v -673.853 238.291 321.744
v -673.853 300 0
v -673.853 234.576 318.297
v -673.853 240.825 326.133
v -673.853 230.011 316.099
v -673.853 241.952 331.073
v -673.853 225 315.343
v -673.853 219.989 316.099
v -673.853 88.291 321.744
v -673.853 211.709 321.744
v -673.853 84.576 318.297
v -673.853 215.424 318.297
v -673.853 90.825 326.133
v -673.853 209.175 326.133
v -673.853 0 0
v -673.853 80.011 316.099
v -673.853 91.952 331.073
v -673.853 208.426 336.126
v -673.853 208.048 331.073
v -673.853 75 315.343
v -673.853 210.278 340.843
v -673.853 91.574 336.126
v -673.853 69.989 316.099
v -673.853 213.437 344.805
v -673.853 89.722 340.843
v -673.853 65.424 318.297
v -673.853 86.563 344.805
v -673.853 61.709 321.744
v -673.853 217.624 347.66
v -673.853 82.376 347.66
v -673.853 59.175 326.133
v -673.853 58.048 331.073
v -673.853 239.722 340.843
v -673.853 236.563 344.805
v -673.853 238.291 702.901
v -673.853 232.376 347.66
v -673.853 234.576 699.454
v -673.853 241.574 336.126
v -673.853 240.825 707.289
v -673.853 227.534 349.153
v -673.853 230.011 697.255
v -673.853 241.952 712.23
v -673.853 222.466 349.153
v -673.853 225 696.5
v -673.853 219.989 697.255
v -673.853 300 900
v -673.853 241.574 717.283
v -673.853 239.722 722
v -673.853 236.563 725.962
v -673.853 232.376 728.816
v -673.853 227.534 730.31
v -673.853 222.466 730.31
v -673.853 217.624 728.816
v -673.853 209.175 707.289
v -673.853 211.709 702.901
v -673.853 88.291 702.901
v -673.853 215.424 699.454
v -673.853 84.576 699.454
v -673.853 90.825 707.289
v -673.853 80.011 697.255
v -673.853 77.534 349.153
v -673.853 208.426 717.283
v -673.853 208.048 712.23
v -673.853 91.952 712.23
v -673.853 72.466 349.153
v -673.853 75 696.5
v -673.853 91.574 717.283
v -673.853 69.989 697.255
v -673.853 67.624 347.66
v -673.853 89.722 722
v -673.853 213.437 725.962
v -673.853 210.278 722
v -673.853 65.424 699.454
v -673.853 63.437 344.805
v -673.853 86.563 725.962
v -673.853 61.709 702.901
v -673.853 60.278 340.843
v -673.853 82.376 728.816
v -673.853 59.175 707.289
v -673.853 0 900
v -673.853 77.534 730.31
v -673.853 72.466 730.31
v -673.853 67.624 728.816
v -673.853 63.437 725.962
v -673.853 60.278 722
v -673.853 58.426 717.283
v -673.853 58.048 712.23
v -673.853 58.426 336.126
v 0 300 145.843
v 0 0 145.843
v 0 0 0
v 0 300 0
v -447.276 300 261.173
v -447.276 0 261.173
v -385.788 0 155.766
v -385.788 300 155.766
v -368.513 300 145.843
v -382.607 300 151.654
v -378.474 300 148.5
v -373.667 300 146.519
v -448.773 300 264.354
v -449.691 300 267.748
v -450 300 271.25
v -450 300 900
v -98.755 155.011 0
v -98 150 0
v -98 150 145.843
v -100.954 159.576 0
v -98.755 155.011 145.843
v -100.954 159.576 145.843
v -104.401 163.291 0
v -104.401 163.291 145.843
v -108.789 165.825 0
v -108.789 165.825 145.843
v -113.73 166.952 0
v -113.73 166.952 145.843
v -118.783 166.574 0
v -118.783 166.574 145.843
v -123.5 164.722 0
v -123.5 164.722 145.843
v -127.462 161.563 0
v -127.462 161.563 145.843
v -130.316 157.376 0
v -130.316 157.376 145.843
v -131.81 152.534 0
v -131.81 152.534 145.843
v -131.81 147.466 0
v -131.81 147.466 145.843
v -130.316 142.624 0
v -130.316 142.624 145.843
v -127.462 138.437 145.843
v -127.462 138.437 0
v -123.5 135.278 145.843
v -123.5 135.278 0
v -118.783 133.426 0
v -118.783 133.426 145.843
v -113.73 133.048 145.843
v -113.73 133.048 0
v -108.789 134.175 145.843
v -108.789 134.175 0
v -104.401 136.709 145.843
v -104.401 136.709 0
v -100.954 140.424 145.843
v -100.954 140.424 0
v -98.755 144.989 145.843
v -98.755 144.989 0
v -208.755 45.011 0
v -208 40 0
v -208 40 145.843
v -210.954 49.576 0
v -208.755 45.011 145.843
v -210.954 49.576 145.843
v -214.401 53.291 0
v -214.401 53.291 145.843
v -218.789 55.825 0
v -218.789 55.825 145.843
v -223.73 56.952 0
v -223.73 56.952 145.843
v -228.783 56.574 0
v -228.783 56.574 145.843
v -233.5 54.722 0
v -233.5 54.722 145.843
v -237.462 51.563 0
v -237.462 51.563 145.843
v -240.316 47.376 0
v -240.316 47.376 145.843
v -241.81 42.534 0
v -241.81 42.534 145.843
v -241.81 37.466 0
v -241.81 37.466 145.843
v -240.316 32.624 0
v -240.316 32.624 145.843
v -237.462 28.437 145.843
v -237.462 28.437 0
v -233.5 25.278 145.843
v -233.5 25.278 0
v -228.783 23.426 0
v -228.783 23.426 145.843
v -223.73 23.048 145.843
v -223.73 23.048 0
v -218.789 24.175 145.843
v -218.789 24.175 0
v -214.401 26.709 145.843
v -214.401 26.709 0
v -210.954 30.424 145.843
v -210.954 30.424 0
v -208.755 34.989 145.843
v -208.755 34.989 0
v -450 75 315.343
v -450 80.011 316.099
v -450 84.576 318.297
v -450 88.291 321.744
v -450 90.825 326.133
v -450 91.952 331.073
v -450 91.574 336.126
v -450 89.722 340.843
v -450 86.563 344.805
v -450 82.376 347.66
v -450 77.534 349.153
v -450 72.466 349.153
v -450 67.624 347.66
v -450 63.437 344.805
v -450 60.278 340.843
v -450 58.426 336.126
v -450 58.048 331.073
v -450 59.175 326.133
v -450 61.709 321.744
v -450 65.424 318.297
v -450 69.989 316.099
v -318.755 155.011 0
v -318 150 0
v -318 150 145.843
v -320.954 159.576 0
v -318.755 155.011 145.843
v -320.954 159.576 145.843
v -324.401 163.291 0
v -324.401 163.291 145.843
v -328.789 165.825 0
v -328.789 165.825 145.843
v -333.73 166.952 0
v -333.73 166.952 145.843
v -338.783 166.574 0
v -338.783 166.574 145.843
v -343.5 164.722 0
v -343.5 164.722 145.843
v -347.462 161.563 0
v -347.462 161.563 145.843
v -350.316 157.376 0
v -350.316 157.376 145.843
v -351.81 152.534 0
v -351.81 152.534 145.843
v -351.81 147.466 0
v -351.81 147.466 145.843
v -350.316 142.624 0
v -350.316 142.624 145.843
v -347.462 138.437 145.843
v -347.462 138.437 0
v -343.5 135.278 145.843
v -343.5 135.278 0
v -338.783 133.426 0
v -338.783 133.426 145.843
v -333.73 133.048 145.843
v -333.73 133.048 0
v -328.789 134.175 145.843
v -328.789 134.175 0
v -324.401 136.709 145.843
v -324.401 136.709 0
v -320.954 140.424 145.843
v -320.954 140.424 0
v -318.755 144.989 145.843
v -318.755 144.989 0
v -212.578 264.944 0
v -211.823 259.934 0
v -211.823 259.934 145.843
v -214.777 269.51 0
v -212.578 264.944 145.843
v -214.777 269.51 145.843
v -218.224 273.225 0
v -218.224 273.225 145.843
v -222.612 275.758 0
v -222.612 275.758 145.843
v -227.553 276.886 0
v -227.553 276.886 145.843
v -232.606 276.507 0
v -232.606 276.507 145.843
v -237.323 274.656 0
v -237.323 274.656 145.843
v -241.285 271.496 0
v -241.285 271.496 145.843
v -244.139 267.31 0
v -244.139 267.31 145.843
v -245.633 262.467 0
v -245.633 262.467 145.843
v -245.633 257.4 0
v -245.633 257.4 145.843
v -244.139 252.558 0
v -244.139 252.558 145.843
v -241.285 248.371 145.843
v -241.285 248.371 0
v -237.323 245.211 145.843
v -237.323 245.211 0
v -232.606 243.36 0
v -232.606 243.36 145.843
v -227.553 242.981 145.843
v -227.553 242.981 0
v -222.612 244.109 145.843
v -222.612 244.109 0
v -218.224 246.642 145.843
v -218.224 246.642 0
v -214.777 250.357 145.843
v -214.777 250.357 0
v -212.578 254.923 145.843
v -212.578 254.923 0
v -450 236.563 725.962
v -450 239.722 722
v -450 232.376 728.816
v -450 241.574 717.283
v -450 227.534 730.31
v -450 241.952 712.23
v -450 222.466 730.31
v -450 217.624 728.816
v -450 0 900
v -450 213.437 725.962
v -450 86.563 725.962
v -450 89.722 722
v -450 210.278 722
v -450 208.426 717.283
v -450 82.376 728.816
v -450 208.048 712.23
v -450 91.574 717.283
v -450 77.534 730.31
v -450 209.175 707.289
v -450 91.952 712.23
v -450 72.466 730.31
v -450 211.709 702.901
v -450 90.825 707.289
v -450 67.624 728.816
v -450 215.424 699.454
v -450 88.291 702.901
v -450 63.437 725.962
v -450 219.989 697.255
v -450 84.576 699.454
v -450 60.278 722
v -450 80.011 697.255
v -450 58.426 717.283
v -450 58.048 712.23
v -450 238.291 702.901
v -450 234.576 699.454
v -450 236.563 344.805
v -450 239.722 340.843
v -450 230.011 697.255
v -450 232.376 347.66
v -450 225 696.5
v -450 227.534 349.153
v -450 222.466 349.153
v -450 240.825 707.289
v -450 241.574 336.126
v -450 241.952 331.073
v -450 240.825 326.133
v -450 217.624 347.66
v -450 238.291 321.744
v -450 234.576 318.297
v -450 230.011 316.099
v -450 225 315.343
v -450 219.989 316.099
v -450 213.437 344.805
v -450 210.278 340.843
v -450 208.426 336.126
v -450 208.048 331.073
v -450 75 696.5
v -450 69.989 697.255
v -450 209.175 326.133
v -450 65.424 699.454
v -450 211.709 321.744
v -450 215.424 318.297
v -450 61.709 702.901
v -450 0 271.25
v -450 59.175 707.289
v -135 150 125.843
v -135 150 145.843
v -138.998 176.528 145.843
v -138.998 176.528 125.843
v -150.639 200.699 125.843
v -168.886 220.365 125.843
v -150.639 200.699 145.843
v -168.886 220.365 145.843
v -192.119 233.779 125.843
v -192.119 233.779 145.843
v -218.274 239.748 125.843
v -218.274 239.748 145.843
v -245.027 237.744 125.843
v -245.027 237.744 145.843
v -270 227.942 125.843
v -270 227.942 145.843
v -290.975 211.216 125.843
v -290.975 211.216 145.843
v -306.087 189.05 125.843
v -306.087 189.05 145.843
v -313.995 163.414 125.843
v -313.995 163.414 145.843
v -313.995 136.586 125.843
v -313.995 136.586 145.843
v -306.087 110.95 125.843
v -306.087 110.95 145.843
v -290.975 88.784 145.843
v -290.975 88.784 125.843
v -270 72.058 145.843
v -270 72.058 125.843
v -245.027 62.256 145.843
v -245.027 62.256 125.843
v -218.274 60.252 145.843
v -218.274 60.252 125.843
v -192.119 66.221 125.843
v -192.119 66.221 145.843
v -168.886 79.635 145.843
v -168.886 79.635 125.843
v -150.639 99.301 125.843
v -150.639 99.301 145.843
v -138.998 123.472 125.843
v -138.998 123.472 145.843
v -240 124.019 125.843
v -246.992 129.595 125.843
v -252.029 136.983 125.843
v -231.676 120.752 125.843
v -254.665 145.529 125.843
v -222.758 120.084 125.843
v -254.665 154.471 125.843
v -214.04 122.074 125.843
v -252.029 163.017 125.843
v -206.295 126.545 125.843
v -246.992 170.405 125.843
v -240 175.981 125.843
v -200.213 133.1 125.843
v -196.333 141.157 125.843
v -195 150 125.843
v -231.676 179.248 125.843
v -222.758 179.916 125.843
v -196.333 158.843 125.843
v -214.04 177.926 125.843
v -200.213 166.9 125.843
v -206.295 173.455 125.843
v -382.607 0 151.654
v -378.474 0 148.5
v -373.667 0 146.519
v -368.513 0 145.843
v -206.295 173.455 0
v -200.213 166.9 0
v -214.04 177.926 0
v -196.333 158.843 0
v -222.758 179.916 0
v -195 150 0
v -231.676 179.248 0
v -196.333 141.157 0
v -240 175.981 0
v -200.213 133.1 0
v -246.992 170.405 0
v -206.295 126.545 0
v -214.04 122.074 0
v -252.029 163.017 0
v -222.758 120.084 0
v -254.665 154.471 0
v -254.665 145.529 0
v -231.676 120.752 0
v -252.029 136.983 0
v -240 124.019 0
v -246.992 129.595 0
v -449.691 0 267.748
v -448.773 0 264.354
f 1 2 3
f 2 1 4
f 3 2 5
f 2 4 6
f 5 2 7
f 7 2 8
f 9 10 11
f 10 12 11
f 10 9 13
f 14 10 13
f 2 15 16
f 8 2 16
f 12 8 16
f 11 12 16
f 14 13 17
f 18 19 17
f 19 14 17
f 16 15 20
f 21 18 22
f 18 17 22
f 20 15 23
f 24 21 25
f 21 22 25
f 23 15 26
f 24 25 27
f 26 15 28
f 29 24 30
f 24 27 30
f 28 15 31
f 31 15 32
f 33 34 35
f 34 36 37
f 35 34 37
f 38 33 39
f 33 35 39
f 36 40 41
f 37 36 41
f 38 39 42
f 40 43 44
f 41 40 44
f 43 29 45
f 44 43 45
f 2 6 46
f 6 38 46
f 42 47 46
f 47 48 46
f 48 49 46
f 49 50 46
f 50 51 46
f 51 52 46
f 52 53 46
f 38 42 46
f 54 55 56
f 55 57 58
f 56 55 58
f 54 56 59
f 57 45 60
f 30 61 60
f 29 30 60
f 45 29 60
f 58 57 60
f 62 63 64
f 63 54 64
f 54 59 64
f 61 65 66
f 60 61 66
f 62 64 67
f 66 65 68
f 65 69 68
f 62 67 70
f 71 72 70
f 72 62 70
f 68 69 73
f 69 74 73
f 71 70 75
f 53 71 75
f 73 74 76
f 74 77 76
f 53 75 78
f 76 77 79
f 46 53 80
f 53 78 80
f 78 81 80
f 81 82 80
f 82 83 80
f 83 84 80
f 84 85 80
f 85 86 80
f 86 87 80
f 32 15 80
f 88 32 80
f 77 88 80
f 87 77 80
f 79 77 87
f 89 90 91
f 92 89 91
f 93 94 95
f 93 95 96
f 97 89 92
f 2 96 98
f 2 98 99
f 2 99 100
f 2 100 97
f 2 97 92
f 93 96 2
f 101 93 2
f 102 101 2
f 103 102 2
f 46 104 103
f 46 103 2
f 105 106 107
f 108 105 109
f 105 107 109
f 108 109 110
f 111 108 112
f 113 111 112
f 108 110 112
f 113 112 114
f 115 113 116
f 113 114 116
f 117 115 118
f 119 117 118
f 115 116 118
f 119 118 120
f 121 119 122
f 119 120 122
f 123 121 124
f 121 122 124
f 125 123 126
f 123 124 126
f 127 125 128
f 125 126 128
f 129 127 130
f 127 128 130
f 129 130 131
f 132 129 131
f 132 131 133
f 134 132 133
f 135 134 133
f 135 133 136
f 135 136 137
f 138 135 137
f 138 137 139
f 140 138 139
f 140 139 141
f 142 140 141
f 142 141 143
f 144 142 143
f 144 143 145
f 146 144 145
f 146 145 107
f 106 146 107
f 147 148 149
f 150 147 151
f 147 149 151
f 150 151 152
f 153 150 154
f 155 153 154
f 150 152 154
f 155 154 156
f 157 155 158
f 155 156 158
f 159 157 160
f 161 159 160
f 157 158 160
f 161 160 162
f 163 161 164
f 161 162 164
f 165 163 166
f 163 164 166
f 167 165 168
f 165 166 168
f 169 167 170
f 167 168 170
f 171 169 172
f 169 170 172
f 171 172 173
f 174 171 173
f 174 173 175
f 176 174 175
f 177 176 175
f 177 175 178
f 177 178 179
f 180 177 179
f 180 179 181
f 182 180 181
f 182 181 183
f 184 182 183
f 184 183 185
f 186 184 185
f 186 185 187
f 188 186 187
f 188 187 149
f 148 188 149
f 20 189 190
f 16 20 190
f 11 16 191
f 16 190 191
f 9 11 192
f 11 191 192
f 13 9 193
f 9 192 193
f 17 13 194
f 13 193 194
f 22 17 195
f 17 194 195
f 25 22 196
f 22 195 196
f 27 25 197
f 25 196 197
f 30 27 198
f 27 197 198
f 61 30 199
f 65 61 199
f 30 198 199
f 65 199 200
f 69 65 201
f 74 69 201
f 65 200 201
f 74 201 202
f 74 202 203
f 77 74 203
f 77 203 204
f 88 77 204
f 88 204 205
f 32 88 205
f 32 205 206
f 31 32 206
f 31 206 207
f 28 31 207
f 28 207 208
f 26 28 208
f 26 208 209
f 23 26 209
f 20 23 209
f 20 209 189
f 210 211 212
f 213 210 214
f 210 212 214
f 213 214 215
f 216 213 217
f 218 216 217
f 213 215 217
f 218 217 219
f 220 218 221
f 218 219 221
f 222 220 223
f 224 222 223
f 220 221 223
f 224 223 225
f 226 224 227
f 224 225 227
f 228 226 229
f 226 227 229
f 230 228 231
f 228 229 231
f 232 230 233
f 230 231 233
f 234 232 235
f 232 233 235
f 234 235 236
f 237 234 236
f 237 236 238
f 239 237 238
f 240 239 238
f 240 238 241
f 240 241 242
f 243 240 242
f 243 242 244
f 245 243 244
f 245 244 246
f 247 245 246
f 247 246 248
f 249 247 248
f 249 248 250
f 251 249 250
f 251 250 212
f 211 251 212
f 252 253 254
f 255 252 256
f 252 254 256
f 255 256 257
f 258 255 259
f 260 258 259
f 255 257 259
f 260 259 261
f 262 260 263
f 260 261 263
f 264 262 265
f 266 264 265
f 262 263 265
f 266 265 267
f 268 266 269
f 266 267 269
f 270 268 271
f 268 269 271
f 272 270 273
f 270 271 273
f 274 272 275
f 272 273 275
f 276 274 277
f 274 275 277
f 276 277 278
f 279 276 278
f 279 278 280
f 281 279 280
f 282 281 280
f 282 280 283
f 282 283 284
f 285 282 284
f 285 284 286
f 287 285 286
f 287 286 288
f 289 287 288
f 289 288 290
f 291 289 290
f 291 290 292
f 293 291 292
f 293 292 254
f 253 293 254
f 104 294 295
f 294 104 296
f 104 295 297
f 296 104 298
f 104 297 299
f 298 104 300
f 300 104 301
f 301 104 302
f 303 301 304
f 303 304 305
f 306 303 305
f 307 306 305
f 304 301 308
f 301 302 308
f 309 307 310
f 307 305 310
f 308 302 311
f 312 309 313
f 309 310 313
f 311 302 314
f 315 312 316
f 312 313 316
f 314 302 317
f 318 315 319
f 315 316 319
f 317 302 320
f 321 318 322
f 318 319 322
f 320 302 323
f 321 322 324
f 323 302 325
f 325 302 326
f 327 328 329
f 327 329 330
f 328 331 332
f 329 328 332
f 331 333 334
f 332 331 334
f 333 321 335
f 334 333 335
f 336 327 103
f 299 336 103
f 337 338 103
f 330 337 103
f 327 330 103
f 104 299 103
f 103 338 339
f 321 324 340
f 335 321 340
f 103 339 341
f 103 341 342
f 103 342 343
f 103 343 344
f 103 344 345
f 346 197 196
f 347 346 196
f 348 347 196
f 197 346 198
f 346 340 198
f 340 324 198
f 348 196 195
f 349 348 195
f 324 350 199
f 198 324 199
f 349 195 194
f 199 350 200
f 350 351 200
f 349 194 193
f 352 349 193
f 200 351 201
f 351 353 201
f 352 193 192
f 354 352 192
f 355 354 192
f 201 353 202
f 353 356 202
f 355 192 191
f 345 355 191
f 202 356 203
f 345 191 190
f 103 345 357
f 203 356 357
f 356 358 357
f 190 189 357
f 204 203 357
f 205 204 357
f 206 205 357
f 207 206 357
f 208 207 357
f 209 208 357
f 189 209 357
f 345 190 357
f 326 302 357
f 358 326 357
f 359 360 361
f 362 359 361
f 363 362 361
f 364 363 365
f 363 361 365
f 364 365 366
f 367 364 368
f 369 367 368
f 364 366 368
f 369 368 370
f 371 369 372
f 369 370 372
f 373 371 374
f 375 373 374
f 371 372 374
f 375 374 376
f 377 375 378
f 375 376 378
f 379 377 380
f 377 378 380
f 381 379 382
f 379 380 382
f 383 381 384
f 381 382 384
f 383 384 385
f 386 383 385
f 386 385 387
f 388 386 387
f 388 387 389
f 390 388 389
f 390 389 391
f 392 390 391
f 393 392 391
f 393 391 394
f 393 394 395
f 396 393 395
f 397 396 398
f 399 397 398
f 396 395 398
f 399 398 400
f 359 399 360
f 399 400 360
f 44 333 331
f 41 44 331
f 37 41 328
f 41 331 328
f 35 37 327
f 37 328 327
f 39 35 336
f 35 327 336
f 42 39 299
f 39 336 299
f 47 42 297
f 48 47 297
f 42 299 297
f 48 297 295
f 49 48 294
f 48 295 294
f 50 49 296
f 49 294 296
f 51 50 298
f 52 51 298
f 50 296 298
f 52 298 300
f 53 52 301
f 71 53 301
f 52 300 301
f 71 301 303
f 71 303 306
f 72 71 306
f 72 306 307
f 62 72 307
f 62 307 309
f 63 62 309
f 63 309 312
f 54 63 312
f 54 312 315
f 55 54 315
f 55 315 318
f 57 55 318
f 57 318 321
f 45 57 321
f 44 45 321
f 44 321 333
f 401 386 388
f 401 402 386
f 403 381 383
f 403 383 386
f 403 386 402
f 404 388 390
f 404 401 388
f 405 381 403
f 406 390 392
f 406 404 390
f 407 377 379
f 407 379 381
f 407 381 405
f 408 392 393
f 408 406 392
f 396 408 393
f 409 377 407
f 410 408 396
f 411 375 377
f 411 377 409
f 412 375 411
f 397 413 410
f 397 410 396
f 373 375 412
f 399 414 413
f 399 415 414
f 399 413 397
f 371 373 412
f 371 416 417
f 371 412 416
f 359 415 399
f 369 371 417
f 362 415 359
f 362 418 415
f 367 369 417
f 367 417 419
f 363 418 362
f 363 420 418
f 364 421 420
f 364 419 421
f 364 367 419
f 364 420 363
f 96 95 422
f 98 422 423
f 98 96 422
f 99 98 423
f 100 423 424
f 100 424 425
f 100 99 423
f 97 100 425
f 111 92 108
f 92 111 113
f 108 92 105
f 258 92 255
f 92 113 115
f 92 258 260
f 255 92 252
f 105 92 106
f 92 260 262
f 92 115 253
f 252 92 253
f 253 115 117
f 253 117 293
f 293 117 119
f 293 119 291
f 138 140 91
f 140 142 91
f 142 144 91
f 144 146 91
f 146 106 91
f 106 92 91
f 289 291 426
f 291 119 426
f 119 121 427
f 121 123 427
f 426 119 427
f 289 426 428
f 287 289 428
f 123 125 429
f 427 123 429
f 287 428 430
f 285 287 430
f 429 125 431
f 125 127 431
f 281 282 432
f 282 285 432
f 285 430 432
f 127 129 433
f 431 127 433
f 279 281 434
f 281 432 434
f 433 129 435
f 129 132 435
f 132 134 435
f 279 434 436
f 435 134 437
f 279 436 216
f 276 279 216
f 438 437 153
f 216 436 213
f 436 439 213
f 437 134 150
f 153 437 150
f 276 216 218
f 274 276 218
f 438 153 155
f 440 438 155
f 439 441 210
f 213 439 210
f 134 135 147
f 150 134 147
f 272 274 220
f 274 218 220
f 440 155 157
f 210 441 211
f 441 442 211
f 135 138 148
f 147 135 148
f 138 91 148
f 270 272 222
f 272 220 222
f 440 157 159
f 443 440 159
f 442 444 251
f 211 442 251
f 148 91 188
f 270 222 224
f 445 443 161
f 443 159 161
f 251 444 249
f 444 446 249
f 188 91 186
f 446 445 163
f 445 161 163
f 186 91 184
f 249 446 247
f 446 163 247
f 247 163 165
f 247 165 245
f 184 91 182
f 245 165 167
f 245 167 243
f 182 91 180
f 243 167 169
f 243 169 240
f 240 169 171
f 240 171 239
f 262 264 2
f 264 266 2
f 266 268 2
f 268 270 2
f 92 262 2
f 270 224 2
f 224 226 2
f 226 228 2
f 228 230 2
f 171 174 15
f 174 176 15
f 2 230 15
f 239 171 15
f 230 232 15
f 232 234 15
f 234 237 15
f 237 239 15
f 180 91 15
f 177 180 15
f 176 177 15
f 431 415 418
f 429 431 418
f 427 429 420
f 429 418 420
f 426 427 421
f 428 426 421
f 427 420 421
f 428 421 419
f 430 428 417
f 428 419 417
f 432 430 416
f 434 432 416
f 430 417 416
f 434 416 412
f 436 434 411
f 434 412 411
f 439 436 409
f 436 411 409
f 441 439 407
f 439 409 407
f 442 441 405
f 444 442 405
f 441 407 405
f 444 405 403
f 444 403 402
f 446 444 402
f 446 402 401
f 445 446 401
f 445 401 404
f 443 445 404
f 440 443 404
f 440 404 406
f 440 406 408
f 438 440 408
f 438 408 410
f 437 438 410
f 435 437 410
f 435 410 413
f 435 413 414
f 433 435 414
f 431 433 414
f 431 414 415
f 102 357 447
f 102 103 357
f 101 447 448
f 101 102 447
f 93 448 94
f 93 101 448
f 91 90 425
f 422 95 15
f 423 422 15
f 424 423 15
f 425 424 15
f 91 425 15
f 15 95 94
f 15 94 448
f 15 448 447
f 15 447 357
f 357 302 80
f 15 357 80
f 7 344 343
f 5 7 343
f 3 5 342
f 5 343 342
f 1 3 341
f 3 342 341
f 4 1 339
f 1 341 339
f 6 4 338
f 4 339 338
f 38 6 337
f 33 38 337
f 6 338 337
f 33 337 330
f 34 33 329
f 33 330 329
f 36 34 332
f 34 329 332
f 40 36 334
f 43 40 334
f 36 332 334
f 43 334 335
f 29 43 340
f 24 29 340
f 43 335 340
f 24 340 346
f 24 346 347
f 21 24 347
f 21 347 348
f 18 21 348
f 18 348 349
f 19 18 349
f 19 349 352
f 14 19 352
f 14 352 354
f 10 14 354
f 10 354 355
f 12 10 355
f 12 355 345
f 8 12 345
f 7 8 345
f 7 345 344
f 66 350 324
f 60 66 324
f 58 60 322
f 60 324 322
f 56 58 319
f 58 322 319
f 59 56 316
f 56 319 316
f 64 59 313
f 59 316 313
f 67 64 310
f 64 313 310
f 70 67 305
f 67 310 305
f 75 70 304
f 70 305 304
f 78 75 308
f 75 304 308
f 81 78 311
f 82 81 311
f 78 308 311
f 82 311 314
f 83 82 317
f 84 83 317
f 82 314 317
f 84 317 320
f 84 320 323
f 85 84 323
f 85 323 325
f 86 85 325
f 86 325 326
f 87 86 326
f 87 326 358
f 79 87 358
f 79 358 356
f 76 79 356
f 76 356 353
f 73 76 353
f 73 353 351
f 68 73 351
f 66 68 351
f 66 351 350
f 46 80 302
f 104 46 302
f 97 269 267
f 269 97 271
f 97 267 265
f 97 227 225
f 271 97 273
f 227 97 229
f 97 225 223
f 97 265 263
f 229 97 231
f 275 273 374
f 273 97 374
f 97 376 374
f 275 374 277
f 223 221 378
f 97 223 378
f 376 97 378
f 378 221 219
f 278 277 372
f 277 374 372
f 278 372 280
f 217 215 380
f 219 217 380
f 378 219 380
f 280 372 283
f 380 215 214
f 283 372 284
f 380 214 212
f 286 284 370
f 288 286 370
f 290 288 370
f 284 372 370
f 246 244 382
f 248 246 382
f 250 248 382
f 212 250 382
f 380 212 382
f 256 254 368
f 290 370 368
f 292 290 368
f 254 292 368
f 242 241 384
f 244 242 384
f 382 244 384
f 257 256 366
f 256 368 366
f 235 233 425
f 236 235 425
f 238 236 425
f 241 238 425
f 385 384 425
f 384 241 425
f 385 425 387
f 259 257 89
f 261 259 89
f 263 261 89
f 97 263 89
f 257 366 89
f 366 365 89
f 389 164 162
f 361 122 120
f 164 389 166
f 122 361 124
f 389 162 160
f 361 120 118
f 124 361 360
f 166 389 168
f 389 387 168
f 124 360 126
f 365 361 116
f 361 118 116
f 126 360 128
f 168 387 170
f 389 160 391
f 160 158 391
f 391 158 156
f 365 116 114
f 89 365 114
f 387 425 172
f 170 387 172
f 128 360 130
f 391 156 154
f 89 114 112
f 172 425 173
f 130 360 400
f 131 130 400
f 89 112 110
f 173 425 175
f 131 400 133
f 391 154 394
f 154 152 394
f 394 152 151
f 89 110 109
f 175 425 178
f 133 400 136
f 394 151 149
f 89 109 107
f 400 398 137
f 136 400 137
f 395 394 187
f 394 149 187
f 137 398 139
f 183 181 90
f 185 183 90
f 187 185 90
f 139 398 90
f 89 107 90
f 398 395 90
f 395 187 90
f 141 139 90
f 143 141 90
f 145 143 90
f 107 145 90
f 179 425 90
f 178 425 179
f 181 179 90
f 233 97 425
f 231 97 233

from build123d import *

# Parameters (mm, degrees)
BOSS_EXTRUDE1_DEPTH = 300
SKETCH3_R           = 17
SKETCH3_R_2         = 30
CUT_EXTRUDE1_DEPTH  = 1055.907875982
SKETCH4_R           = 90
CUT_EXTRUDE2_DEPTH  = 20
SKETCH5_R           = 17
CUT_EXTRUDE3_DEPTH  = 1051
CHAMFER1_SIZE       = 70
CHAMFER1_SIZE2      = 120
FILLET1_R           = 20


with BuildPart() as part:
    # Sketch2 → Boss-Extrude1 (new body)
    with BuildSketch(Plane(origin=(0, 0, 0), x_dir=(-1, 0, 0), z_dir=(0, 1, 0))):
        Polygon((0, 0), (673.85334868, 0), (673.85334868, 900), (450, 900), (450, 145.843324447), (0, 145.843324447), align=None)
    extrude(amount=BOSS_EXTRUDE1_DEPTH)

    # Sketch3 → Cut-Extrude1 (cut, through all)
    with BuildSketch(Plane.XY.offset(145.843324447)):
        with Locations((-335, 150)):
            Circle(SKETCH3_R)
        with Locations((-228.822978678, 259.933547355)):
            Circle(SKETCH3_R)
        with Locations((-115, 150)):
            Circle(SKETCH3_R)
        with Locations((-225, 40)):
            Circle(SKETCH3_R)
        with Locations((-225, 150)):
            Circle(SKETCH3_R_2)
    extrude(amount=-CUT_EXTRUDE1_DEPTH, mode=Mode.SUBTRACT)

    # Sketch4 → Cut-Extrude2 (cut)
    with BuildSketch(Plane.XY.offset(145.843324447)):
        with Locations((-225, 150)):
            Circle(SKETCH4_R)
    extrude(amount=-CUT_EXTRUDE2_DEPTH, mode=Mode.SUBTRACT)

    # Sketch5 → Cut-Extrude3 (cut, through all)
    with BuildSketch(Plane.YZ.offset(-450)):
        with Locations(Location((75, 713.5, 0), (0, 0, 270))):
            Circle(SKETCH5_R)
        with Locations(Location((225, 713.5, 0), (0, 0, 270))):
            Circle(SKETCH5_R)
        with Locations(Location((75, 332.343324447, 0), (0, 0, 270))):
            Circle(SKETCH5_R)
        with Locations(Location((225, 332.343324447, 0), (0, 0, 270))):
            Circle(SKETCH5_R)
    extrude(amount=-CUT_EXTRUDE3_DEPTH, mode=Mode.SUBTRACT)

    # Chamfer1
    chamfer1_edges = [part.edges().sort_by_distance(p)[0] for p in [
        (-450, 150, 145.843324447),
    ]]
    chamfer1_side = [part.faces().sort_by_distance(p)[0] for p in [
        (-444.591673087, 150, 145.843324447),
    ]]
    chamfer(chamfer1_edges, length=CHAMFER1_SIZE, length2=CHAMFER1_SIZE2, reference=chamfer1_side[0])

    # Fillet1
    fillet1_edges = [part.edges().sort_by_distance(p)[0] for p in [
        (-380, 150, 145.843324447),
        (-450, 150, 265.843324447),
    ]]
    fillet(fillet1_edges, radius=FILLET1_R)


solid = part.part
